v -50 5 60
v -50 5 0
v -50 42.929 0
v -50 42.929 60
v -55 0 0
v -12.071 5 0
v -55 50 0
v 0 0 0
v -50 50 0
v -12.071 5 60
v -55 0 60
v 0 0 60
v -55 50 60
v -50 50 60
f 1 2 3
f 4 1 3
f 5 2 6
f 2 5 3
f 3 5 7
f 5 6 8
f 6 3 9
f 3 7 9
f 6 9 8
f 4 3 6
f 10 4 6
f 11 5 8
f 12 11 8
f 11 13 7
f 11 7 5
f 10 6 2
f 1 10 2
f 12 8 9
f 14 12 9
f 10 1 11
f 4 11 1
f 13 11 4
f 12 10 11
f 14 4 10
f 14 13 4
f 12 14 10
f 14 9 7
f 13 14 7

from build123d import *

# Parameters (mm, degrees)
F1_DEPTH = 60


with BuildPart() as f1:
    # F0 (on Top) → F1 (new body)
    with BuildSketch(Plane.XY):
        Polygon((-55, 0), (0, 0), (-50, 50), (-55, 50), align=None)
        Polygon((-50, 5), (-50, 42.928932), (-12.071068, 5), align=None, mode=Mode.SUBTRACT)
    extrude(amount=F1_DEPTH)


solid = f1.part
